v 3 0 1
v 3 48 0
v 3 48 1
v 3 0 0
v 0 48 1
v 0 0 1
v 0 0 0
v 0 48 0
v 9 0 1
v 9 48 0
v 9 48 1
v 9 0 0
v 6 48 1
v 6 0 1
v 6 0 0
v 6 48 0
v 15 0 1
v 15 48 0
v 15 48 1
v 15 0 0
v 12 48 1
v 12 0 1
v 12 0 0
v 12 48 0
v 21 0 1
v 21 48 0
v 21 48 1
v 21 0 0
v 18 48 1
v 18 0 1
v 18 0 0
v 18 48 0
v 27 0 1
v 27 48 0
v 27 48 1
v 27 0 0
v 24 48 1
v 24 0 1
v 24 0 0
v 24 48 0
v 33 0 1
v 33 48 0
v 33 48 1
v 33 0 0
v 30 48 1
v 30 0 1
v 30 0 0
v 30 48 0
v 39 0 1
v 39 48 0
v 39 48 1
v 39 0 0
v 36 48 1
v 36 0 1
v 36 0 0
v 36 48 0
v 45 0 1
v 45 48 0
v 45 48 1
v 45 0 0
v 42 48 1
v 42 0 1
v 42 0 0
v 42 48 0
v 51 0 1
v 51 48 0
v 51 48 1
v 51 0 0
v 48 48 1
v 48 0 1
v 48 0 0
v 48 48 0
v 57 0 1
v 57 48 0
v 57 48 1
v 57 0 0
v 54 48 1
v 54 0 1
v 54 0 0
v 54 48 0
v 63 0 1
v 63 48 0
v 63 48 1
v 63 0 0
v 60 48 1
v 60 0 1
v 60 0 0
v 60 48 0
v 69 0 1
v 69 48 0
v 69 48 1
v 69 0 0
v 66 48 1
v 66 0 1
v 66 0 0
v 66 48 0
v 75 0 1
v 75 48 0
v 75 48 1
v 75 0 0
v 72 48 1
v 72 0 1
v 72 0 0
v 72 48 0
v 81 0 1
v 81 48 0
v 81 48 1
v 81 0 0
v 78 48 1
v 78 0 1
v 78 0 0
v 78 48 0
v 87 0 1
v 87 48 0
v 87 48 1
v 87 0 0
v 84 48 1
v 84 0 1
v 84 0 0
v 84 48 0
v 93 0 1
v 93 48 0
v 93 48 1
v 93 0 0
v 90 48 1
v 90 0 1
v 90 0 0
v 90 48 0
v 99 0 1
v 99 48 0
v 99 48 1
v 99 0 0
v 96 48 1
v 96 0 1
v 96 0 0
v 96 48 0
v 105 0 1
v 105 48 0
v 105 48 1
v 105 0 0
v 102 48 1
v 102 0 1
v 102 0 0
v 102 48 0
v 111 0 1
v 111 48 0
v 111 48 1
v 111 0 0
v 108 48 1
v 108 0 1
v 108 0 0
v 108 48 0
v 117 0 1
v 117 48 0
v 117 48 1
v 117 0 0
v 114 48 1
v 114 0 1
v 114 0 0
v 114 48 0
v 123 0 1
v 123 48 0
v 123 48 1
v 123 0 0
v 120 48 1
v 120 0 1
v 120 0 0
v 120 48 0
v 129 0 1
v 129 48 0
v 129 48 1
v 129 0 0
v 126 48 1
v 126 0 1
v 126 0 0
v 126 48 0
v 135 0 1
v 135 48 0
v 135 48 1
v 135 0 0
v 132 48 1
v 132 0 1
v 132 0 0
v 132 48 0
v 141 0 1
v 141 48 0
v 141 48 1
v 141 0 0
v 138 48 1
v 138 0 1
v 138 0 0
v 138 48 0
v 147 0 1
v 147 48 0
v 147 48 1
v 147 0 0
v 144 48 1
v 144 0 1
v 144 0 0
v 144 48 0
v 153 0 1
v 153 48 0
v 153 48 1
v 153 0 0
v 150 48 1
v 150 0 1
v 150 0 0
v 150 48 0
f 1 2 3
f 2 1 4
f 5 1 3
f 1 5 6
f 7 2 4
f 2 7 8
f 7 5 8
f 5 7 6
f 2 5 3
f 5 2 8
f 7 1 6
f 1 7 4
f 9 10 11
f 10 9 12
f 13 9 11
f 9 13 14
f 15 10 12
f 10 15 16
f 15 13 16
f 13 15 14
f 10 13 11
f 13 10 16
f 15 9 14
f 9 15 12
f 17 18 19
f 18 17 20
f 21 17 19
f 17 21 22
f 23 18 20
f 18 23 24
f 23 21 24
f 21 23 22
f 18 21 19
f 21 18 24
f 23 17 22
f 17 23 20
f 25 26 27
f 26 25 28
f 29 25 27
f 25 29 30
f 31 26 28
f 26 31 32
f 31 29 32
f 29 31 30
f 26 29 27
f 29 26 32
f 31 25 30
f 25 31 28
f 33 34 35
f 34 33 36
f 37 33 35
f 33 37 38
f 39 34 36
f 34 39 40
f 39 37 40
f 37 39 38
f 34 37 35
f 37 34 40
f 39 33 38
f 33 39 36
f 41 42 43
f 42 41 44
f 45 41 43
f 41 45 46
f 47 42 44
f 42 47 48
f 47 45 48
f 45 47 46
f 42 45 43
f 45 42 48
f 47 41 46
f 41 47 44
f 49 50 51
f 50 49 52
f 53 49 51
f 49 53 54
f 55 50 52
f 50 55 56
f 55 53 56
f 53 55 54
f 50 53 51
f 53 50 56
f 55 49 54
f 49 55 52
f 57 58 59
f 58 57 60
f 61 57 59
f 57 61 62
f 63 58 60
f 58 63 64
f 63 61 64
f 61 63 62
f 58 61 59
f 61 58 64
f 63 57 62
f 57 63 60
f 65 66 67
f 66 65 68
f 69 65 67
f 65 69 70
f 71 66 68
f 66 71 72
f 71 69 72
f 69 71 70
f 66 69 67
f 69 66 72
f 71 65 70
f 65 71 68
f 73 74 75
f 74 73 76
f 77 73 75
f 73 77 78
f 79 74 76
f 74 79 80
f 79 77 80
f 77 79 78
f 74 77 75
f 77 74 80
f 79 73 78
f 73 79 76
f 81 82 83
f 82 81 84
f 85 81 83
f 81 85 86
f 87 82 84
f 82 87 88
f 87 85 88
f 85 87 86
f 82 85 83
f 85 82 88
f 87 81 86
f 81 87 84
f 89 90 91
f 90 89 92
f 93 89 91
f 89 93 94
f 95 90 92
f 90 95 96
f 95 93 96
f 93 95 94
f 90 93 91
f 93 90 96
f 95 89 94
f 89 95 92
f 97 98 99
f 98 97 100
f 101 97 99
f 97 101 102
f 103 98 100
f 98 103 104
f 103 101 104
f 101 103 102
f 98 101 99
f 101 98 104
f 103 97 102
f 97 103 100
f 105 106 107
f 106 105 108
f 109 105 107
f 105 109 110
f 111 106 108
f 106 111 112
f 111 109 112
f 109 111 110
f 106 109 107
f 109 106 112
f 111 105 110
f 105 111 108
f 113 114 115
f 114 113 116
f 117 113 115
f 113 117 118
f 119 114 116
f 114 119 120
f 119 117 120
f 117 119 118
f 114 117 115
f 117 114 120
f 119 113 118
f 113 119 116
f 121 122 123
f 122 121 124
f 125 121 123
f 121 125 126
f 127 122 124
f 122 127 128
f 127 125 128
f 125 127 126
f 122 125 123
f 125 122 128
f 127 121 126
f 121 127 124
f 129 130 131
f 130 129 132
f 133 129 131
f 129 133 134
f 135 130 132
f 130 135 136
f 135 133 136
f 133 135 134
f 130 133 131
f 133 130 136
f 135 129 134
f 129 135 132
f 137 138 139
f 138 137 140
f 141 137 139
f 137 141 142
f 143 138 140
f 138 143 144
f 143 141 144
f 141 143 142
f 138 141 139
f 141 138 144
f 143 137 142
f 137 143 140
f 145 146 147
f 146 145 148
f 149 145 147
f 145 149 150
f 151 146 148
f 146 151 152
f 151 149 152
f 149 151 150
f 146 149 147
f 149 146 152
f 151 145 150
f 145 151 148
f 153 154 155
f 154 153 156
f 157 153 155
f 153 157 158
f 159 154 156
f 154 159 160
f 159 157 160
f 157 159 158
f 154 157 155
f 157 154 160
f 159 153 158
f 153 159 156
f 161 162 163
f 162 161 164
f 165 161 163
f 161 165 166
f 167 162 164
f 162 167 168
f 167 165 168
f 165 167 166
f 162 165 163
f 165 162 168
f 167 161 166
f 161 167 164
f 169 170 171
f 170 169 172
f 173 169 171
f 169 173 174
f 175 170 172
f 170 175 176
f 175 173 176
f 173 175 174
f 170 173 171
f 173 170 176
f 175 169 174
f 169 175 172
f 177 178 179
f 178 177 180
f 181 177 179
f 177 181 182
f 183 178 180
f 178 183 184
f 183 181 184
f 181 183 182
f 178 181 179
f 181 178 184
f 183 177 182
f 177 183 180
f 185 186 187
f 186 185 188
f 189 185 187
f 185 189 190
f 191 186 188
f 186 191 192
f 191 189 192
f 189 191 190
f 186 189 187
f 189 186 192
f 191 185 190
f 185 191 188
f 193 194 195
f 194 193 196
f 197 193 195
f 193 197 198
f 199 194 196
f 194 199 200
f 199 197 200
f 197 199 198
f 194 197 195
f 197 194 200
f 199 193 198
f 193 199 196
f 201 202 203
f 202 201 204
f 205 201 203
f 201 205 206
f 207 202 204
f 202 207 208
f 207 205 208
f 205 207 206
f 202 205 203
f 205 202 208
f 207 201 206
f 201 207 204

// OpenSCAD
// assuming all in inches

picket_width=3;
picket_gap=3;
picket_height=4*12;
picket_depth=1;

fence_length=13*12;
cube([picket_width,picket_height,picket_depth]);


number_pickets=floor(fence_length/(picket_width+picket_gap));
echo(number_pickets);

for ( j = [0:1:number_pickets-1]) {
    translate([(picket_gap+picket_width)*j,0,0])
    cube([picket_width,picket_height,picket_depth]);
    
    
}
